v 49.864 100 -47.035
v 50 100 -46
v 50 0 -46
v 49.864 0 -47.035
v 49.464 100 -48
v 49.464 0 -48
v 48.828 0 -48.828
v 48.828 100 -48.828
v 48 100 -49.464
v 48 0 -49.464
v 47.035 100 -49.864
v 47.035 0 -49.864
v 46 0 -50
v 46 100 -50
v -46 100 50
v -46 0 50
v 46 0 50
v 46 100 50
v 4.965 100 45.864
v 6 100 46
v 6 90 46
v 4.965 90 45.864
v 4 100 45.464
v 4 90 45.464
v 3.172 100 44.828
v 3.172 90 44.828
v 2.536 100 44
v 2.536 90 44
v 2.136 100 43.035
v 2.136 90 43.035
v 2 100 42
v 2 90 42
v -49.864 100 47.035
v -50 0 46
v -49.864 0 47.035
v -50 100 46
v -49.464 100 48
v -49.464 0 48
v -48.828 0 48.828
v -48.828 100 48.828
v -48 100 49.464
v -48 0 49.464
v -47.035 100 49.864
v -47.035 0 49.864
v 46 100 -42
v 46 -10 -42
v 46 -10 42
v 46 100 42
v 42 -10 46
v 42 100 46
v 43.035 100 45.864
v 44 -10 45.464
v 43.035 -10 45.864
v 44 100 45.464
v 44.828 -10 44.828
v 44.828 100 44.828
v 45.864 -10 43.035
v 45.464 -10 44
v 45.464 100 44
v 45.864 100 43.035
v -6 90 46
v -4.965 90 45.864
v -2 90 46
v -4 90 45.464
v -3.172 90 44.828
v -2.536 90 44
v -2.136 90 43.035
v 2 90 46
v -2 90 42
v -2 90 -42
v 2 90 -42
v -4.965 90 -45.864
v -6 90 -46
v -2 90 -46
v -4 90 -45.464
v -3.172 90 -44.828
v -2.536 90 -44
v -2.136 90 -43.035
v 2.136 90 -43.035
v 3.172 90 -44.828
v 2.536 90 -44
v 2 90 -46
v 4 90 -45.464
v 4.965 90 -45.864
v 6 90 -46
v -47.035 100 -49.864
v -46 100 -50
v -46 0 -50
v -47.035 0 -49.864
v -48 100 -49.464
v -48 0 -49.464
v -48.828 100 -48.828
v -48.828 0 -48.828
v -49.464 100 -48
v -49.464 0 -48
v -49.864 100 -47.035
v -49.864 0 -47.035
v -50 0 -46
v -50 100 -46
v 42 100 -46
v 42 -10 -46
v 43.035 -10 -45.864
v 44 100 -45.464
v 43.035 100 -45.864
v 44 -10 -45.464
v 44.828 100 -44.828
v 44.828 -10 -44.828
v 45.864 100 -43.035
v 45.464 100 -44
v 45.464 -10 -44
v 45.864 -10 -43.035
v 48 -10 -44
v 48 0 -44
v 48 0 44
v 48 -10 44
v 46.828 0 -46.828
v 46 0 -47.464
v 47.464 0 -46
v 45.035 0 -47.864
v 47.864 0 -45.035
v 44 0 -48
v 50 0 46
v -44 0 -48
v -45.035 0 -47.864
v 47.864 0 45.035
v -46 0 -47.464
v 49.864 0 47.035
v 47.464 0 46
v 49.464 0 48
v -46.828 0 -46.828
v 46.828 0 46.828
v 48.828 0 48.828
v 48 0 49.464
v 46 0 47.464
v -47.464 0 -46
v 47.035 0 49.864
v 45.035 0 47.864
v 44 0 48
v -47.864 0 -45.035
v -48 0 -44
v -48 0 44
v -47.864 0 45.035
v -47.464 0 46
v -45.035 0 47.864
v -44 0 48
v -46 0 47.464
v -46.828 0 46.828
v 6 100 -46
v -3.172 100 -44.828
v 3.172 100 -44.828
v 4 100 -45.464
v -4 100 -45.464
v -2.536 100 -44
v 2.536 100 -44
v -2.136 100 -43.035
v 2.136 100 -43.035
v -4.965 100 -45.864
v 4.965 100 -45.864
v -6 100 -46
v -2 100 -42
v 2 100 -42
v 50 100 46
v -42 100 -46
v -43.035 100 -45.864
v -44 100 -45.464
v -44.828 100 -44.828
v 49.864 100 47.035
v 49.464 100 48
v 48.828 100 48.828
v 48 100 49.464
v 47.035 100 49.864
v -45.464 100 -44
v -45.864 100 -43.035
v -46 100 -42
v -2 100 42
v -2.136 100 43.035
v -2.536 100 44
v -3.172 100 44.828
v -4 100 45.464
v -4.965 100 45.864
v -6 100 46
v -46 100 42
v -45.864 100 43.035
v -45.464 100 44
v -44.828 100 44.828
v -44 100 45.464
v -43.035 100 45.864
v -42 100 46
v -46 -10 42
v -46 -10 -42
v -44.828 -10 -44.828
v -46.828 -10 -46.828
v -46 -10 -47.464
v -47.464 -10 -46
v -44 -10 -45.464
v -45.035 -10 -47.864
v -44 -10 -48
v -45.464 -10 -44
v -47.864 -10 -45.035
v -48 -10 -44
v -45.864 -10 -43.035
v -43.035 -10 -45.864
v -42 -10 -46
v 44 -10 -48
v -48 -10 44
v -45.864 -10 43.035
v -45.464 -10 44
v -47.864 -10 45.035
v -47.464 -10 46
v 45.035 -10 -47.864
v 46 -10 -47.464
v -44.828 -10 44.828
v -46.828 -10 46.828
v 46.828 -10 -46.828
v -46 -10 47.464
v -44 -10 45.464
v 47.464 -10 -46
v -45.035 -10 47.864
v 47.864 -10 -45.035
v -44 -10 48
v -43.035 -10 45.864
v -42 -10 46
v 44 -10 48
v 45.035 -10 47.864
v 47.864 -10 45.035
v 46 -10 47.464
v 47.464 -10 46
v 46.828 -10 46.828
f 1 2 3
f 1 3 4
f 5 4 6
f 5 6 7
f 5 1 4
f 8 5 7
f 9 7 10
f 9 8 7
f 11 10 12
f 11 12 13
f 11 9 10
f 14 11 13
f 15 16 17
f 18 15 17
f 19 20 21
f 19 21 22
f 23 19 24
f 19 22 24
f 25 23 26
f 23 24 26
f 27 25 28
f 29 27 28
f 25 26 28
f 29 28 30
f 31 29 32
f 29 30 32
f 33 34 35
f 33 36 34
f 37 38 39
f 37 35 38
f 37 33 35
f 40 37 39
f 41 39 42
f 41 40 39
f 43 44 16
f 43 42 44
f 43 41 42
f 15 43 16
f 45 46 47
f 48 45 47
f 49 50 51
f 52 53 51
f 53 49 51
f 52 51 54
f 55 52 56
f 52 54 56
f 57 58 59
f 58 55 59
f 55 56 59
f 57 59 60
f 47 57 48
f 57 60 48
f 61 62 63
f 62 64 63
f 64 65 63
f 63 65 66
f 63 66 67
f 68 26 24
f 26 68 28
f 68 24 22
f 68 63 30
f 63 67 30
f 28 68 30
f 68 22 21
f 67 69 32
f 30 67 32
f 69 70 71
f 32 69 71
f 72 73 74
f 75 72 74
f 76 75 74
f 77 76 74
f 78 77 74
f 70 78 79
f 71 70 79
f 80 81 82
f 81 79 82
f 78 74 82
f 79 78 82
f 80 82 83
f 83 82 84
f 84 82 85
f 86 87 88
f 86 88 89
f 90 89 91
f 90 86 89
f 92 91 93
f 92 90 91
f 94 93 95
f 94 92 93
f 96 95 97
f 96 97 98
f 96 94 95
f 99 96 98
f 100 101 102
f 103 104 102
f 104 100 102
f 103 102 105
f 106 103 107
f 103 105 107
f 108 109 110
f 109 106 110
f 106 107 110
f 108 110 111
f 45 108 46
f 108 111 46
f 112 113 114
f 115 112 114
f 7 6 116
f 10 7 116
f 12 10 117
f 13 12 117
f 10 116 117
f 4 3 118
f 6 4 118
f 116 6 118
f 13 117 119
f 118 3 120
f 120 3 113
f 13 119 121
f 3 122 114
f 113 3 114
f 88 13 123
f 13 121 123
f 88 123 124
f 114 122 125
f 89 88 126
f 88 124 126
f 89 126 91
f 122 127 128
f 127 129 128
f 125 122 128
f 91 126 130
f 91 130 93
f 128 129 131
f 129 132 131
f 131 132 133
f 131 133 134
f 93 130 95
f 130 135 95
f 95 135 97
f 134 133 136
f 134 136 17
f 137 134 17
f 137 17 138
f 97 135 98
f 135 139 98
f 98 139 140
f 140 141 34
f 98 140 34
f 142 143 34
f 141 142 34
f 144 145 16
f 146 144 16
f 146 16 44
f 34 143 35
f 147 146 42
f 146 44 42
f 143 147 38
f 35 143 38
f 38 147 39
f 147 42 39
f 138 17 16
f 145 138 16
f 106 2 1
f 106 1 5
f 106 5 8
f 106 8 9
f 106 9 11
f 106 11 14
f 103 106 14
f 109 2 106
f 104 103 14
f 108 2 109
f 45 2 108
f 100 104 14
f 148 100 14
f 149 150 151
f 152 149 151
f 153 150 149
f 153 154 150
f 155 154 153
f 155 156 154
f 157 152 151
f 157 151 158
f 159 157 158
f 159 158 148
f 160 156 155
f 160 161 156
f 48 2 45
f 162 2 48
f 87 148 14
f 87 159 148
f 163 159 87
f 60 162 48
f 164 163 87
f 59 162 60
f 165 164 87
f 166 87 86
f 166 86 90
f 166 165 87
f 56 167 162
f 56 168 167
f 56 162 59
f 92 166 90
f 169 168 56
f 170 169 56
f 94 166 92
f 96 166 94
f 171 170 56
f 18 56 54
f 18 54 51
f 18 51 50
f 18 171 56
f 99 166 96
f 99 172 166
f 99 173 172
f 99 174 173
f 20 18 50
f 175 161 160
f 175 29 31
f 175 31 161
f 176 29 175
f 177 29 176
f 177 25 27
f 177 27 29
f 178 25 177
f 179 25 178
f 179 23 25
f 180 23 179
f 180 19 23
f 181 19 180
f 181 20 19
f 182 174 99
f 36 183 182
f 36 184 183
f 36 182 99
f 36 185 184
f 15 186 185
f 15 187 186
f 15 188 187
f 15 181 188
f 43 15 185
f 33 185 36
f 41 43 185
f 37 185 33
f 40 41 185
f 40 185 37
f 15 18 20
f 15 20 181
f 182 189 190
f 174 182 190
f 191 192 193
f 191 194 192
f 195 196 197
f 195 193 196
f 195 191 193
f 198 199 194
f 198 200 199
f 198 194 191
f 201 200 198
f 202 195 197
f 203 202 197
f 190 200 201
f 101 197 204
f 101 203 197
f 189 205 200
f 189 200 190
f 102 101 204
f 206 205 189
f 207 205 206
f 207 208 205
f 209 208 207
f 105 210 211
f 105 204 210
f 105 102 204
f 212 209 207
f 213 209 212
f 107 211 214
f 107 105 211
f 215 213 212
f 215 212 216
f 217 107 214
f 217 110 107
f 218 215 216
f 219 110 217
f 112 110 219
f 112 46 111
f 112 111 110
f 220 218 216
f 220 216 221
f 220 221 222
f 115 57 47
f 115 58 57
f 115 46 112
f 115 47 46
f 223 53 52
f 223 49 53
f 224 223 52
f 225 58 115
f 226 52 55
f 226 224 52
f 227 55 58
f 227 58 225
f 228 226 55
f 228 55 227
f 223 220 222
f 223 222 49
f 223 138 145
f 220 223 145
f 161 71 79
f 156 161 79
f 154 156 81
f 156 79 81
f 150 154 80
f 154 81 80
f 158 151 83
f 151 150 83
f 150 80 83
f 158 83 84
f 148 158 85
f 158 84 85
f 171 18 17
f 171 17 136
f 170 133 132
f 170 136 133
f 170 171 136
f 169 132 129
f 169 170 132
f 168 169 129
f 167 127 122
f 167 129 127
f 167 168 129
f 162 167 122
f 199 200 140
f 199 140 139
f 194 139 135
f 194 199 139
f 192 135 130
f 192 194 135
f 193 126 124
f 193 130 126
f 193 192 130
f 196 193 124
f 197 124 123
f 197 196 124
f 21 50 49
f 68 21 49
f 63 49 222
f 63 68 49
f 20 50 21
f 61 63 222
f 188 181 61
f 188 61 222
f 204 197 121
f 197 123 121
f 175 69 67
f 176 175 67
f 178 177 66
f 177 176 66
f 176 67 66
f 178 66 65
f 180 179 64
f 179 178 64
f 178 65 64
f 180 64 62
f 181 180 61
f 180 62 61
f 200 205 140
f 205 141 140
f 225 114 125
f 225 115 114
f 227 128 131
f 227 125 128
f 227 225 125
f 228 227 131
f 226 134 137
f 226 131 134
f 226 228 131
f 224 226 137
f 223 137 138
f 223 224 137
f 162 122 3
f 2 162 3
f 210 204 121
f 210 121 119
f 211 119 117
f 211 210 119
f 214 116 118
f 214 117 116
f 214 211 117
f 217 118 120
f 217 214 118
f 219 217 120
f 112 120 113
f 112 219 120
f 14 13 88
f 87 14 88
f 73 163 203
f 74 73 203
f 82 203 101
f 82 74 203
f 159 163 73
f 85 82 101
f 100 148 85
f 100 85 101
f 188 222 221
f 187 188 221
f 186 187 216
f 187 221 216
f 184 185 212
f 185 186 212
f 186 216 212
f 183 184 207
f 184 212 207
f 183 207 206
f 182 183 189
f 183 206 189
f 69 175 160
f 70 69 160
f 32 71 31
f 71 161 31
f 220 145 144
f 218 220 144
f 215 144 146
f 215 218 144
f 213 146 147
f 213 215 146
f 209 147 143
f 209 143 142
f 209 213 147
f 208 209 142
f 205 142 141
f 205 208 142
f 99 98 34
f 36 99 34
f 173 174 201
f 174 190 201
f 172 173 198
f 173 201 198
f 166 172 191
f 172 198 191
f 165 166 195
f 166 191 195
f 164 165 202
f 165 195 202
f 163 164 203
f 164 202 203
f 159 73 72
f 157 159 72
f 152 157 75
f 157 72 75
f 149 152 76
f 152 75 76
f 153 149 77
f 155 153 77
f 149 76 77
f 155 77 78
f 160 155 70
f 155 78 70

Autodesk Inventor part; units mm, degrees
ref_plane "YZ Plane" through (0, 0, 0) normal (1, 0, 0) x (0, 1, 0)
ref_plane "XZ Plane" through (0, 0, 0) normal (0, 1, 0) x (-1, 0, 0)
ref_plane "XY Plane" through (0, 0, 0) normal (0, 0, 1) x (1, 0, 0)
sketch "Szkic1" plane through (0, 0, 0) normal (0, 1, 0) x (-1, 0, 0)
  line L0 (-50, -50) -> (50, -50)
  line L1 (50, -50) -> (50, 50)
  line L2 (50, 50) -> (-50, 50)
  line L3 (-50, 50) -> (-50, -50)
  line L4 (-50, -50) -> (50, 50) construction
  line L5 (50, -50) -> (-50, 50) construction
  point P0 (0, 0)
  dimension "d0" = 100
  dimension "d1" = 100
extrude "Wyciągnięcie proste1" add sketch "Szkic1" along normal blind 100
sketch "Szkic2" plane through (0, 100, 0) normal (0, 1, 0) x (1, 0, 0)
  line L0 (46, -46) -> (-46, -46)
  line L1 (-46, -46) -> (-46, 46)
  line L2 (-46, 46) -> (46, 46)
  line L3 (46, 46) -> (46, -46)
  line L4 (46, -46) -> (-46, 46) construction
  line L5 (-46, -46) -> (46, 46) construction
  point P0 (0, 0)
  dimension "d4" = 92
  dimension "d5" = 92
extrude "Wyciągnięcie proste2" cut sketch "Szkic2" against normal blind 100
sketch "Szkic3" plane through (0, 0, 0) normal (0, -1, 0) x (1, 0, 0)
  line L0 (-48, -48) -> (48, -48)
  line L1 (48, -48) -> (48, 48)
  line L2 (48, 48) -> (-48, 48)
  line L3 (-48, 48) -> (-48, -48)
  line L4 (-48, -48) -> (48, 48) construction
  line L5 (48, -48) -> (-48, 48) construction
  line L6 (-46, -46) -> (46, -46)
  line L7 (46, -46) -> (46, 46)
  line L8 (46, 46) -> (-46, 46)
  line L9 (-46, 46) -> (-46, -46)
  line L10 (-46, -46) -> (46, 46) construction
  line L11 (46, -46) -> (-46, 46) construction
  point P0 (0, 0)
  dimension "d8" = 96
  dimension "d9" = 96
  dimension "d10" = 92
  dimension "d11" = 92
extrude "Wyciągnięcie proste3" add sketch "Szkic3" along normal blind 10 contours L3 L2 L1 L0 | L9 L8 L7 L6
sketch "Szkic4" plane through (0, -10, 0) normal (0, -1, 0) x (1, 0, 0)
  line L0 (46, 46) -> (-46, 46)
  line L1 (-46, 46) -> (-46, -46)
  line L2 (-46, -46) -> (46, -46)
  line L3 (46, -46) -> (46, 46)
  line L4 (46, 46) -> (-46, -46) construction
  line L5 (-46, 46) -> (46, -46) construction
  point P0 (0, 0)
  dimension "d14" = 92
  dimension "d15" = 92
extrude "Wyciągnięcie proste4" cut sketch "Szkic4" against normal blind 10
sketch "Szkic5" plane through (0, 100, 0) normal (0, 1, 0) x (1, 0, 0)
  line L0 (-2, 46) -> (2, 46)
  line L1 (2, 46) -> (2, -46)
  line L2 (2, -46) -> (-2, -46)
  line L3 (-2, -46) -> (-2, 46)
  line L4 (-2, 46) -> (2, -46) construction
  line L5 (2, 46) -> (-2, -46) construction
  point P0 (0, 0)
  dimension "d18" = 4
  dimension "d19" = 92
extrude "Wyciągnięcie proste5" add sketch "Szkic5" against normal blind 10
sketch "Szkic6" plane through (0, 100, 0) normal (0, 1, 0) x (1, 0, 0)
  line L0 (46, 46) -> (46, -46) projected
  line L1 (2, 46) -> (46, 46) projected
  line L2 (50, 50) -> (-50, 50) projected
  line L3 (50, -50) -> (50, 50) projected
  line L4 (2, -46) -> (2, 46) projected
  point P0 (0, 0)
  point P1 (46, 0)
fillet "Zaokrąglenie1" radius 4 16 edges at (2, 95, 46) (2, 95, -46) (-2, 95, -46) (-2, 95, 46) (50, 50, 50) (-50, 50, 50) (-50, 50, -50) (50, 50, -50) (46, 45, -46) (46, 45, 46) (-46, 45, 46) (-46, 45, -46) (-48, -5, 48) (48, -5, 48) (48, -5, -48) (-48, -5, -48)
equation "\"PromieńGięcia\" = Grubość"
equation "\"SzerokośćGięciaPodcięcia\" = Grubość"
equation "\"GłębokośćGięciaPodcięcia\" = 0.5 * Grubość"
equation "\"RozmiarPodcięciaNarożnika\" = 4 * Grubość"
equation "\"MinimalnaPozostałość\" = 2 * Grubość"
equation "\"PromieńPrzejścia\" = PromieńGięcia"
equation "\"Rozmiar_promienia_Jacobiego\" = PromieńGięcia"
equation "\"Wielk_odstępu\" = Grubość"
equation "\"Grubość\" = 0.5"
